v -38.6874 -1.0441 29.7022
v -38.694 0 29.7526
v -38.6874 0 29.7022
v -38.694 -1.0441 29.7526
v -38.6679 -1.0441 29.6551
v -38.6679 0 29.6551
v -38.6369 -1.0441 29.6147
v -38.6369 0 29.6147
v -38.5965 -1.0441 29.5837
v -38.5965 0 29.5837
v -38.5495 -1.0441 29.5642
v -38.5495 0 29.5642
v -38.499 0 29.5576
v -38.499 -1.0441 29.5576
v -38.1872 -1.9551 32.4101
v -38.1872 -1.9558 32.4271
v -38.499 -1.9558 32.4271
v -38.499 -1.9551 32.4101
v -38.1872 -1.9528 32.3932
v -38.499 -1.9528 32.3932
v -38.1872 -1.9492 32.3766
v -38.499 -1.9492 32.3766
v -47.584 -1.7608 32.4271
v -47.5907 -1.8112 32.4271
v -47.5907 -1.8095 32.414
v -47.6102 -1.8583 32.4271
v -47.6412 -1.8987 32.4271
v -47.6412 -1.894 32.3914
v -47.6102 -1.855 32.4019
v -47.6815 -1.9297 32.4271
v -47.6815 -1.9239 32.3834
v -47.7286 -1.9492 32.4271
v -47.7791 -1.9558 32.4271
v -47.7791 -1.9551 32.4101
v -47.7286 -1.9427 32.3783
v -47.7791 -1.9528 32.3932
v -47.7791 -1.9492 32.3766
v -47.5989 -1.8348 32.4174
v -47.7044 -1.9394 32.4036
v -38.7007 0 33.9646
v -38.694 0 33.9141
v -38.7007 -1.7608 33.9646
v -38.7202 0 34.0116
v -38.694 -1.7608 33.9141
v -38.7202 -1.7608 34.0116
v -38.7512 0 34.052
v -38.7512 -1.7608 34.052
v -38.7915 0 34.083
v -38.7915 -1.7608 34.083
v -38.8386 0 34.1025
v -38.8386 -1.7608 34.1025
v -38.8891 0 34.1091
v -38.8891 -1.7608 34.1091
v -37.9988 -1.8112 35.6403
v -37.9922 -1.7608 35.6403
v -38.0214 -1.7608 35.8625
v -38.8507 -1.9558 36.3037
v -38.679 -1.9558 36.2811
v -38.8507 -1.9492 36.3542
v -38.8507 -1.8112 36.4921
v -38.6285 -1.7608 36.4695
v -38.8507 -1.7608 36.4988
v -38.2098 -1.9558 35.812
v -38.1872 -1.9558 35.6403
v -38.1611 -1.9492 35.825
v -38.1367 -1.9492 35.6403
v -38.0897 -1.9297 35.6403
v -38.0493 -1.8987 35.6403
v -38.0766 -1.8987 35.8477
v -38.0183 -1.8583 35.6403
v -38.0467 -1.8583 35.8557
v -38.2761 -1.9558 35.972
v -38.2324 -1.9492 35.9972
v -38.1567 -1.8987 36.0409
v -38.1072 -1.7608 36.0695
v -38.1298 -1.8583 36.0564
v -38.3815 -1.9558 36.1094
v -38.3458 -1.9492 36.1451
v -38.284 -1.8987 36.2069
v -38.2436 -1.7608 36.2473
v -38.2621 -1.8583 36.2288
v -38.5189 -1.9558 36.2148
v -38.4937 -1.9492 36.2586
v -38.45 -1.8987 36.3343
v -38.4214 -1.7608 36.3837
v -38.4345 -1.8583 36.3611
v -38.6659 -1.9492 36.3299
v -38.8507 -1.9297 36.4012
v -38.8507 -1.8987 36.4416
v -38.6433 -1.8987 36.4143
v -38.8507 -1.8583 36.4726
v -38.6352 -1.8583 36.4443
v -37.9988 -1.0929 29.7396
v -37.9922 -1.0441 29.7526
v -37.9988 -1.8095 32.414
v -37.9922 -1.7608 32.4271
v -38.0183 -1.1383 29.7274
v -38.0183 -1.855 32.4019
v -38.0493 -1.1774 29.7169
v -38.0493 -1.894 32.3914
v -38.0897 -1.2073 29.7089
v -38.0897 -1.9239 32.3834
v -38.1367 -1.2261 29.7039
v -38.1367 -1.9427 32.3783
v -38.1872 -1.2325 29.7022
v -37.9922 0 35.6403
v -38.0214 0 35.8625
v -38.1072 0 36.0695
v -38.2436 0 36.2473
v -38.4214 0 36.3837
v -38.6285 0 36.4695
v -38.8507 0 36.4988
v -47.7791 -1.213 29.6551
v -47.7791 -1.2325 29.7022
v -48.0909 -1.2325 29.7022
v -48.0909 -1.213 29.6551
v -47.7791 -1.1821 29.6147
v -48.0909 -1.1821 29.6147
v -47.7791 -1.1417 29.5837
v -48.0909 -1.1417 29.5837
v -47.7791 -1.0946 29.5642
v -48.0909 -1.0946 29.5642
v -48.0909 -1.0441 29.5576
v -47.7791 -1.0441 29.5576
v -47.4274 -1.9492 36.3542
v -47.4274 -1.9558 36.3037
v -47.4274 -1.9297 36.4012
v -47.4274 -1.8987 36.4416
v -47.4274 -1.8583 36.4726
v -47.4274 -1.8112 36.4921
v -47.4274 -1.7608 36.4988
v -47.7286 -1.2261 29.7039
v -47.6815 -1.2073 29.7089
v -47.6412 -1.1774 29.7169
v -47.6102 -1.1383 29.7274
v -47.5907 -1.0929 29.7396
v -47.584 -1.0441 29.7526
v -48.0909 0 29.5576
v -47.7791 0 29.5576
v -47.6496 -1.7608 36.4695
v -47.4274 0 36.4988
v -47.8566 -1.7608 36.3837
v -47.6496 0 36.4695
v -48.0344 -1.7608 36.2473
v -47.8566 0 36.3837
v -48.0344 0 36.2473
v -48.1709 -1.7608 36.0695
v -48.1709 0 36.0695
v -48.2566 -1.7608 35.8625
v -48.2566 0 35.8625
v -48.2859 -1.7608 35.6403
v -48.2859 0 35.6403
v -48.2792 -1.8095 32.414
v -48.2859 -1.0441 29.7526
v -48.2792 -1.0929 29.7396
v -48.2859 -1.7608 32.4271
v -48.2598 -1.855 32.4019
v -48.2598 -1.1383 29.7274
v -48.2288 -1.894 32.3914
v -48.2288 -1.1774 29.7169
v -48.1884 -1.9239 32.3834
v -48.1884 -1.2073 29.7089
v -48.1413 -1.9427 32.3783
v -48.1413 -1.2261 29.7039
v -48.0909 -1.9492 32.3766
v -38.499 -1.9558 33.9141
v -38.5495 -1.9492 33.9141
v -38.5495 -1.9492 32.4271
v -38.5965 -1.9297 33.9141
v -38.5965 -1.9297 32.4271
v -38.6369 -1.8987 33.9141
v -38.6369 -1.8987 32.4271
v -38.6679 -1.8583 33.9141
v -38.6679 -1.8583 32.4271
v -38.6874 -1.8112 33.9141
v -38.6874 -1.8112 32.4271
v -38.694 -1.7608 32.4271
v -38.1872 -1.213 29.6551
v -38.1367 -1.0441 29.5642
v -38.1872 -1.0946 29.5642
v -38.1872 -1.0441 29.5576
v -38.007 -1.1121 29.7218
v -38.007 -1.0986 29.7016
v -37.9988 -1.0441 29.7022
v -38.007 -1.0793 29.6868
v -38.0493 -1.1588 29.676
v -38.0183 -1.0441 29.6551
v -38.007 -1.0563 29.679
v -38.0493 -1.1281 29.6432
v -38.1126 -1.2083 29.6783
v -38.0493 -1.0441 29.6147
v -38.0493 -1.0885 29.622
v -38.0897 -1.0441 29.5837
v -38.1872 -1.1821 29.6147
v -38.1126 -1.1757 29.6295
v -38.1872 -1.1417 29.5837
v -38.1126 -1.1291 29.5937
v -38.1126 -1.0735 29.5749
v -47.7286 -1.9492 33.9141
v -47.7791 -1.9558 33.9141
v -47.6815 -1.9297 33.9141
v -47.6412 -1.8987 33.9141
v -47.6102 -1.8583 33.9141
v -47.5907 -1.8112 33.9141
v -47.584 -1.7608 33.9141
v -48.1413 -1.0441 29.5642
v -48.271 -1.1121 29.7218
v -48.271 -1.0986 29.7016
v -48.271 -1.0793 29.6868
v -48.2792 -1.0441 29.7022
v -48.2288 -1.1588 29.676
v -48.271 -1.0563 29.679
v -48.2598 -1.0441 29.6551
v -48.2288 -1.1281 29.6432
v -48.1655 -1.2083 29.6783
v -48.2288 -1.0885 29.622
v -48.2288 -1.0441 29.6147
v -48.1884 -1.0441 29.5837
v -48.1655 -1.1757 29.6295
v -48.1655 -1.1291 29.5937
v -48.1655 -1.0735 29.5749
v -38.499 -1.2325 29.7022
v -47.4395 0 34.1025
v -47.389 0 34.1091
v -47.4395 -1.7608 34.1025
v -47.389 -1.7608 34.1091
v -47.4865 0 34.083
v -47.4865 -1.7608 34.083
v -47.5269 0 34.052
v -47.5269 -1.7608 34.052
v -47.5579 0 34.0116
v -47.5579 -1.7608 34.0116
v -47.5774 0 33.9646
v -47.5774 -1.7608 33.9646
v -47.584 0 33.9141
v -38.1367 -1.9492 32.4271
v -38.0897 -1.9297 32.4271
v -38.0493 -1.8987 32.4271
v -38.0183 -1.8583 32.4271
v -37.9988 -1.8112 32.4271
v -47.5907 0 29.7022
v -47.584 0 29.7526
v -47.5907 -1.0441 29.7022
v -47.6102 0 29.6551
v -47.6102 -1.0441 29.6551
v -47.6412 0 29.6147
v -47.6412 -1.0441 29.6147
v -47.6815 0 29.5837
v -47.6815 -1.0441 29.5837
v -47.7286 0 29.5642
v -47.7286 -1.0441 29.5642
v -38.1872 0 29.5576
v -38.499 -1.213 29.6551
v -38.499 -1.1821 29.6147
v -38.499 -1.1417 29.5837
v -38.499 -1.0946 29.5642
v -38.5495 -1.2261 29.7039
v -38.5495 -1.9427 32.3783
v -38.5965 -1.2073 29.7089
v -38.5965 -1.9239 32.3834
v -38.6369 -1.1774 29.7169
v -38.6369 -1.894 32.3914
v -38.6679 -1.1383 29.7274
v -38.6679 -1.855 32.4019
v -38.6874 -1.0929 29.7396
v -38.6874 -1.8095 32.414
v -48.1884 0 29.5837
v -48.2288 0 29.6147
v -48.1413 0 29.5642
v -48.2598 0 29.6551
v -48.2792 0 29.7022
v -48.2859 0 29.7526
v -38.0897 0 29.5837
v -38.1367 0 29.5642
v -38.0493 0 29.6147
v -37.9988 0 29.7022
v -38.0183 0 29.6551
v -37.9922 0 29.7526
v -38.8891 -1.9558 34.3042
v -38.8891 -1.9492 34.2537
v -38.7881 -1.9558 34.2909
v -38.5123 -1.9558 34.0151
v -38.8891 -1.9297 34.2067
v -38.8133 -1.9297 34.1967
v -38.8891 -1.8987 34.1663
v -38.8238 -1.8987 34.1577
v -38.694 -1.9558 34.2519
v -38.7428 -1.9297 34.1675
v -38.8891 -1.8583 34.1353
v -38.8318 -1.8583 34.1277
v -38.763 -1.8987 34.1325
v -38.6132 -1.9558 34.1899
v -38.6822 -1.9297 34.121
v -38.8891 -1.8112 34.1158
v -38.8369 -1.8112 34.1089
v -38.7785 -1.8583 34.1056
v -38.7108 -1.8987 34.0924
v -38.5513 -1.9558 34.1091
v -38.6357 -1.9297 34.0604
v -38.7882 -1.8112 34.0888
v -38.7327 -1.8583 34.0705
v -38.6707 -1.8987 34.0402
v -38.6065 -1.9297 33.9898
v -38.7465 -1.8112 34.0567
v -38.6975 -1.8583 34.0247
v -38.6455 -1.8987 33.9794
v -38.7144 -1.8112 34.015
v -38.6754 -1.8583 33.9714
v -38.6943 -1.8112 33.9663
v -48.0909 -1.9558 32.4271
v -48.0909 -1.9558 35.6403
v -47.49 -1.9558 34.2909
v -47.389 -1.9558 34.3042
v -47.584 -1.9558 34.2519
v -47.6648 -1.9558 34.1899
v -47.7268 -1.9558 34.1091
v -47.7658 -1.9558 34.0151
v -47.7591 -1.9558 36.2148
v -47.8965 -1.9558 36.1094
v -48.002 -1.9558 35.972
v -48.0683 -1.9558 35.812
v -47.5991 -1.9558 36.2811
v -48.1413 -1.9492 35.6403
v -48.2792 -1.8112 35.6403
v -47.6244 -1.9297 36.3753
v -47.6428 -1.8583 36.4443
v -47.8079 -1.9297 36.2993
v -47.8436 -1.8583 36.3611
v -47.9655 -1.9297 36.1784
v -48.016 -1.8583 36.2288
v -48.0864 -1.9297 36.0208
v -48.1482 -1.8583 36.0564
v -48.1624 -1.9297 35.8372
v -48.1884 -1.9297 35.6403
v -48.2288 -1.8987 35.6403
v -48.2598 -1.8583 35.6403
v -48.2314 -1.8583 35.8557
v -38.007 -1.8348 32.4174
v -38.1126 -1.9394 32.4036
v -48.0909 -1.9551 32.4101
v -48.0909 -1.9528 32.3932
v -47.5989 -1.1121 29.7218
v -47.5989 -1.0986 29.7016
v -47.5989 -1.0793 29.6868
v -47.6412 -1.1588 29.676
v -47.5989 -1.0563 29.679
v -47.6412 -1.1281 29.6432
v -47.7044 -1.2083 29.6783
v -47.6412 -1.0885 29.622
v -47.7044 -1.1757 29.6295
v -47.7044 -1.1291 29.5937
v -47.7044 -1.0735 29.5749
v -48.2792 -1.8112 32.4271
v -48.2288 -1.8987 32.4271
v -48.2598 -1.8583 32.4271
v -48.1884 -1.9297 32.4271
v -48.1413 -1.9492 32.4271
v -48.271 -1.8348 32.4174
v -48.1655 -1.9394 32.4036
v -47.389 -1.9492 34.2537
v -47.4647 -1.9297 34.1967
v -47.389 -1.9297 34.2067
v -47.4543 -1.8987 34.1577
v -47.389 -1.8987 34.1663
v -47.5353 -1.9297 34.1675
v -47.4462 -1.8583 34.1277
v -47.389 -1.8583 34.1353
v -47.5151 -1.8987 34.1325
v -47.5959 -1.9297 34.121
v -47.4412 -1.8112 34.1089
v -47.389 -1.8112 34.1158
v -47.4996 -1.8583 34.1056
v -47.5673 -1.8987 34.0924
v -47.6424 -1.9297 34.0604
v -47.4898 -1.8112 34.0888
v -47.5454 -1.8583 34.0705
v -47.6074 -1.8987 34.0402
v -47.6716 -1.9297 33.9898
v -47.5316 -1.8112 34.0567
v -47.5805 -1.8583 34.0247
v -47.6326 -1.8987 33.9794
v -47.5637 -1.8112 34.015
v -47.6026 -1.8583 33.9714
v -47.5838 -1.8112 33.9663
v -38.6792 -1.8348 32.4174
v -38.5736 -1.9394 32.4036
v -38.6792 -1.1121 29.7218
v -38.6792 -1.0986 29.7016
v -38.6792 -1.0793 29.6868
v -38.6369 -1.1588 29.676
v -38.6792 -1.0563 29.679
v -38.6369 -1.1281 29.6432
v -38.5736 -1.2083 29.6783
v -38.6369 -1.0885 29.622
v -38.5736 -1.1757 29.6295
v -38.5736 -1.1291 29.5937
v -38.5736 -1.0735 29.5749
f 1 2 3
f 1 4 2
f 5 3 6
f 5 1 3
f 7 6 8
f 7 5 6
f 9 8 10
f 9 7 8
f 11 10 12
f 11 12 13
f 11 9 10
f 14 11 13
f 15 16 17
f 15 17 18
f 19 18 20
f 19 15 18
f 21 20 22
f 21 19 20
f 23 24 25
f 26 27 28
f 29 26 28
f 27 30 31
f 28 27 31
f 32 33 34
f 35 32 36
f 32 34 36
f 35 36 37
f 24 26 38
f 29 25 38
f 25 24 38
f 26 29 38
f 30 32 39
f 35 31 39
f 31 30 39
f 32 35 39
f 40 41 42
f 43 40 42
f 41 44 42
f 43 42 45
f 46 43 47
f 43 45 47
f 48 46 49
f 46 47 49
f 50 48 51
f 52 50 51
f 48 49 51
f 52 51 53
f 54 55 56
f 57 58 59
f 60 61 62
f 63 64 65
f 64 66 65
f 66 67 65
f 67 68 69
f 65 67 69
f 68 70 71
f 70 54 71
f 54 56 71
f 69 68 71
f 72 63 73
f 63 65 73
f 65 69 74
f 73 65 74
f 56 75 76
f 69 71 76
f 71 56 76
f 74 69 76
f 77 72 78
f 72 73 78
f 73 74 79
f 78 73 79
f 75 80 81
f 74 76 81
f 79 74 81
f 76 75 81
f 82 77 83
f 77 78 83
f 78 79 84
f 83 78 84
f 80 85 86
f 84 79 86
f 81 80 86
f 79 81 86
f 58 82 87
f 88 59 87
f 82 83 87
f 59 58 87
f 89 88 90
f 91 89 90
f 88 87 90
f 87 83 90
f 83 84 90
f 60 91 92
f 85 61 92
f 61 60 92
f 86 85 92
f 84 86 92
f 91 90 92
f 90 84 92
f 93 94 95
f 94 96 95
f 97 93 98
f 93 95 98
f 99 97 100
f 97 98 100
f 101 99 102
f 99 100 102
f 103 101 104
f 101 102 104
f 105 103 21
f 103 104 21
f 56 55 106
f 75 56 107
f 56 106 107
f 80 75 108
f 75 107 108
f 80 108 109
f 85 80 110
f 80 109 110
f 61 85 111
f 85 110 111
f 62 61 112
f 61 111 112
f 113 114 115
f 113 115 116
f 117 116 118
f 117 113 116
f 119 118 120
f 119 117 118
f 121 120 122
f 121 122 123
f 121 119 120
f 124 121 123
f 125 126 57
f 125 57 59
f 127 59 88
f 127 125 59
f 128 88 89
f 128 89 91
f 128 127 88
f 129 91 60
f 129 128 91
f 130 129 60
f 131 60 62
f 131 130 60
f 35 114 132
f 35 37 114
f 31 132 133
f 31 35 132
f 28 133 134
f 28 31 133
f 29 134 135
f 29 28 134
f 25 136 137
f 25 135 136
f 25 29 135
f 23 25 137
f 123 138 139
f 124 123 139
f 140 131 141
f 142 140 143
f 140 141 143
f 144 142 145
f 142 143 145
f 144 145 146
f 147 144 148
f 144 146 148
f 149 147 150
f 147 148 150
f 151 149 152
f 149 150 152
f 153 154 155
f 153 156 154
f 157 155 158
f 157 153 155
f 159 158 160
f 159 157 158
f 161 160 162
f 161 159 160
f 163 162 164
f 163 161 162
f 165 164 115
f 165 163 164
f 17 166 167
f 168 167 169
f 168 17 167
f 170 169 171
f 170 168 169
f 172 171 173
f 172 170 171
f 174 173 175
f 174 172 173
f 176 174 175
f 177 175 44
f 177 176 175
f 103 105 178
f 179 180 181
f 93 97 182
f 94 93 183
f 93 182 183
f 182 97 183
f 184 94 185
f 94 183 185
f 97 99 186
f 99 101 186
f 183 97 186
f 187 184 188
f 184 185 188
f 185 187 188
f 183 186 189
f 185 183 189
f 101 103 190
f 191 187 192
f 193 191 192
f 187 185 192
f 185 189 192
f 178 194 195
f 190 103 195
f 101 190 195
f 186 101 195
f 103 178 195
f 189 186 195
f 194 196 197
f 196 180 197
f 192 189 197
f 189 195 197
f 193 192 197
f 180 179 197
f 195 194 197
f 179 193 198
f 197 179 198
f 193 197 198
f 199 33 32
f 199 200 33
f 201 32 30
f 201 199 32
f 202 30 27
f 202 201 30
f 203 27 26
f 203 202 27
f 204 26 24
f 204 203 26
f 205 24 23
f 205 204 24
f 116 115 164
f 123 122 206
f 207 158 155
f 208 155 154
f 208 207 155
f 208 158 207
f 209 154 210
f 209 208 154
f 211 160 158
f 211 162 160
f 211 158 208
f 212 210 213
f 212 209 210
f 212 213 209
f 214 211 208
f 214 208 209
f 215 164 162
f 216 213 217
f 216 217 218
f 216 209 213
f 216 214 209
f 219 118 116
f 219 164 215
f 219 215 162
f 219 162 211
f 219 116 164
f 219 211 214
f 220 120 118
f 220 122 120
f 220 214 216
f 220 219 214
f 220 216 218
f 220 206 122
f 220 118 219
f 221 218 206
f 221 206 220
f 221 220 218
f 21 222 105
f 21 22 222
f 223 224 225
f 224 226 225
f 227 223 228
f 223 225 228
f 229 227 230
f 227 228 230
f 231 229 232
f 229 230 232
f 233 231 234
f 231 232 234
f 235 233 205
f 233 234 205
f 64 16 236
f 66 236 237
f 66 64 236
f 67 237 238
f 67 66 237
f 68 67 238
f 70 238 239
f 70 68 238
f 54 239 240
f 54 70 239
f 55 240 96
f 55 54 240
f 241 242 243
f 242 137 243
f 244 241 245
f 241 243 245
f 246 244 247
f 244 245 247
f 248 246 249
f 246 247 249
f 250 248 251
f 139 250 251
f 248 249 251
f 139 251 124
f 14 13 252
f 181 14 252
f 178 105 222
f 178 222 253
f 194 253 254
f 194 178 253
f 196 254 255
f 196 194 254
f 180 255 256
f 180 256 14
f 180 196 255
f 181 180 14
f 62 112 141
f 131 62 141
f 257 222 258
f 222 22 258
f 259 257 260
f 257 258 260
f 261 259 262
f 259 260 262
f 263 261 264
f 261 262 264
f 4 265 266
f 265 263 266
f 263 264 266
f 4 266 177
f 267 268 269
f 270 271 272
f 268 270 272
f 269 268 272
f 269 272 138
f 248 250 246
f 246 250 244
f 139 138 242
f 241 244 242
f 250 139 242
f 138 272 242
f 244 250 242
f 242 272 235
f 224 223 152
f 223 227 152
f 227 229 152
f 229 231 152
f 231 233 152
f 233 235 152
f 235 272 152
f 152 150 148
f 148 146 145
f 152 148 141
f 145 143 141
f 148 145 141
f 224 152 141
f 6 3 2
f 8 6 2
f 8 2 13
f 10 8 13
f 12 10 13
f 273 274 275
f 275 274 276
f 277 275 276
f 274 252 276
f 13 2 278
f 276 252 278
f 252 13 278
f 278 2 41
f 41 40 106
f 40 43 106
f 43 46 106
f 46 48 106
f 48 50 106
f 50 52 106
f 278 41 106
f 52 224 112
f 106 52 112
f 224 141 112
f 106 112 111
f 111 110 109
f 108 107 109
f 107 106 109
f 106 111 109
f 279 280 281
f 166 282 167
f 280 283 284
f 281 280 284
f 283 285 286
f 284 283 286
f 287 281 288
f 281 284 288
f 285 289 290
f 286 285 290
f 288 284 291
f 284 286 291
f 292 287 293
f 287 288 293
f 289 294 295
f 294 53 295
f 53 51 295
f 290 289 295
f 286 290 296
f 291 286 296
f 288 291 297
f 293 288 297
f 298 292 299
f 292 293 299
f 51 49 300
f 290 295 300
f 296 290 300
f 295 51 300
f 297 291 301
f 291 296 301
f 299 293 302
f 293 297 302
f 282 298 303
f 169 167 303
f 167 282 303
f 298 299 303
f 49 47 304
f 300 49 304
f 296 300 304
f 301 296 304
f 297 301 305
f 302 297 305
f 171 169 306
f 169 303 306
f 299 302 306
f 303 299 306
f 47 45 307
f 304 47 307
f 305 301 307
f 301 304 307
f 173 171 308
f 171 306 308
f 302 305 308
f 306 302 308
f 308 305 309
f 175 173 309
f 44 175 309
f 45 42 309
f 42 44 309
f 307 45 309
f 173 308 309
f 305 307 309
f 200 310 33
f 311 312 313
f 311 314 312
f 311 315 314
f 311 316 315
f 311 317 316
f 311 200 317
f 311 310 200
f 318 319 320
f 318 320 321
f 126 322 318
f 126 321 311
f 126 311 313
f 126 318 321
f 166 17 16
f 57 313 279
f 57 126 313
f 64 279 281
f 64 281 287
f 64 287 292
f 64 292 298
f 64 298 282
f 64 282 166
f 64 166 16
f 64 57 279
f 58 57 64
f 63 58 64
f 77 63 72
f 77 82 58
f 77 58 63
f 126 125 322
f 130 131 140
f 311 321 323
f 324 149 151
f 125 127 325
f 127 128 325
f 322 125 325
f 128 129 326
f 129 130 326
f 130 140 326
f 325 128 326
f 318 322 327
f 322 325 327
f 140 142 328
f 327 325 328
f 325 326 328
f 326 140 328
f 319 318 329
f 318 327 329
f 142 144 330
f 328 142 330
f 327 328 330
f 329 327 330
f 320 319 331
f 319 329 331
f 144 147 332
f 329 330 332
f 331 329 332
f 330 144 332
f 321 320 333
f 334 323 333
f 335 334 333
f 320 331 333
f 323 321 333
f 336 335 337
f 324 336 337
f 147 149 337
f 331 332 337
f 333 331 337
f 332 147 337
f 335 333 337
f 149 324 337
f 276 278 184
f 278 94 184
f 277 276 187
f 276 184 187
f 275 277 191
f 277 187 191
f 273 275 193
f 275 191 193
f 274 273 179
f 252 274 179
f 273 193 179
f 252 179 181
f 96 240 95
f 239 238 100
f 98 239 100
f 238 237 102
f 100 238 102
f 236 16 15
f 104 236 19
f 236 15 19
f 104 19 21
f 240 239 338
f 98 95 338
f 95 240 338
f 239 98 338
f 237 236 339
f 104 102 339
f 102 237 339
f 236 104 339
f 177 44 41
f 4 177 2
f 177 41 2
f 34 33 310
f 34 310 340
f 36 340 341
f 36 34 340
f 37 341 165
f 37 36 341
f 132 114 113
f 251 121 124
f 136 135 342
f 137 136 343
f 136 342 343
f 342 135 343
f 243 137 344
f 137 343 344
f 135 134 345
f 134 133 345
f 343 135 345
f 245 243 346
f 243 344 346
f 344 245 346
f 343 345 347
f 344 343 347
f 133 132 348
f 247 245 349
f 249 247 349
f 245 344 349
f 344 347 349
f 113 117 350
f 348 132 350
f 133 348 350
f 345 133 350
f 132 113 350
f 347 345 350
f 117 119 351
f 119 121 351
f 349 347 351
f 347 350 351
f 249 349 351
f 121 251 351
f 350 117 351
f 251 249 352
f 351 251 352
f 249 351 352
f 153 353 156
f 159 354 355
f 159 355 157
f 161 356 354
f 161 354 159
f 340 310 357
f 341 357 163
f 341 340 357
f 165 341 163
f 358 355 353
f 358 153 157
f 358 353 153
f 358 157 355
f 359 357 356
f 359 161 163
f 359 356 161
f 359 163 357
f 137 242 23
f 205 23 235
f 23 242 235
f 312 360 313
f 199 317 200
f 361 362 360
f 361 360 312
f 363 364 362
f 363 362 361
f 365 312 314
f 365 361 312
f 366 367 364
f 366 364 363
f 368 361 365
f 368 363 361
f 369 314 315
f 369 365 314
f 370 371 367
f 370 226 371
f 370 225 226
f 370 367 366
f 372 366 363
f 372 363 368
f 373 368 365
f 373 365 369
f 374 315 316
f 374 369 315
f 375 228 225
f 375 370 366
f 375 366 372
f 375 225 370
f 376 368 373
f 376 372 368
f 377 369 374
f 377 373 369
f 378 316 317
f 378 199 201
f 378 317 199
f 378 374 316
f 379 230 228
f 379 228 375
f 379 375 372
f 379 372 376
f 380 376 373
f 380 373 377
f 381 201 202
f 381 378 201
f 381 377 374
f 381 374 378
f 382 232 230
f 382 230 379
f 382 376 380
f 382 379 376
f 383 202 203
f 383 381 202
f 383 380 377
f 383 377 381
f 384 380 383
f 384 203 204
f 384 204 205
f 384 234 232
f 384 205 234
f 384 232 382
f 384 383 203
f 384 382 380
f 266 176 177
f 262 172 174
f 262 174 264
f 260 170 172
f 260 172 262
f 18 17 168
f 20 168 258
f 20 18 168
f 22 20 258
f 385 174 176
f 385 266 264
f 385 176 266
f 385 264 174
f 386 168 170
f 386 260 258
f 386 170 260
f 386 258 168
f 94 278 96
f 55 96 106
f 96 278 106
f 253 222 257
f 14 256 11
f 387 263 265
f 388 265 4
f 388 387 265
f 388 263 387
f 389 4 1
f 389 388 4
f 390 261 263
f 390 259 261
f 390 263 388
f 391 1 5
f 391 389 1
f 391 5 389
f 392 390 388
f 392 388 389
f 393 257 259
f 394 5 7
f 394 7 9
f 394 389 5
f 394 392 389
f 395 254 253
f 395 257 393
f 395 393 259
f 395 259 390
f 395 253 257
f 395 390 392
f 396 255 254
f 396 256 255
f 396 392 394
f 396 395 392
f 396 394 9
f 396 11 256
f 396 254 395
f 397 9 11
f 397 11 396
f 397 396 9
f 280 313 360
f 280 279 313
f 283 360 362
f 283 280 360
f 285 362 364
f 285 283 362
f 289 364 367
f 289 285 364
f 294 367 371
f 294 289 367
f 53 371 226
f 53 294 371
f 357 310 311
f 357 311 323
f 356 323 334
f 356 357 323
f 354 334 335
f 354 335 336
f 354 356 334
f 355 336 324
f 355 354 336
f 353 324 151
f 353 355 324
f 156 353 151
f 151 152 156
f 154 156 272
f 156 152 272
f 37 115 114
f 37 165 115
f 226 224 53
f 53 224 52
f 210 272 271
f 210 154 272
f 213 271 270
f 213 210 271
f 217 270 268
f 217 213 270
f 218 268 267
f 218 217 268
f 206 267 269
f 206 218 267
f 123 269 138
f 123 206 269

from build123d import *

# Parameters (mm, degrees)
F1_DEPTH    = 1.9558
F2_SIZE2    = 2.8438227154
F2_SIZE     = 0.762
F2_2_SIZE2  = 2.8438227154
F2_2_SIZE   = 0.762
F3_R        = 0.1950302499
F4_T1_DEPTH = 4.1020358569
F4_T4_ANGLE = 90
F4_T6_ANGLE = 90


# Not quite as in the source:
# - a fillet or chamfer that OpenCascade refuses, or shapes differently, is made with other operations: its cross-section is extruded or revolved along the edge and cut away or added


with BuildPart() as f1:
    # F0 (on Front) → F1 (new body)
    with BuildSketch(Plane.XZ):
        Polygon((-37.9921731242, 36.4987568722), (-48.2858929149, 36.4987568722), (-48.2858929149, 34.1091437473), (-48.2858929149, 29.5576006174), (-47.5840330195, 29.5576006174), (-47.5840330195, 34.1091437473), (-43.1390330195, 34.1091437473), (-38.6940330195, 34.1091437473), (-38.6940330195, 29.5576006174), (-37.9921731242, 29.5576006174), (-37.9921731242, 34.1091437473), align=None)
    extrude(amount=F1_DEPTH)

    # F2
    f2_edges = [f1.edges().sort_by_distance(p)[0] for p in [
        (-47.934963, -1.9558, 29.557601),
    ]]
    f2_side = f1.faces().sort_by_distance((-47.934963, -0.9779, 29.557601))[0]
    chamfer(f2_edges, length=F2_SIZE, length2=F2_SIZE2, reference=f2_side)

    # F2#2
    f2_2_edges = [f1.edges().sort_by_distance(p)[0] for p in [
        (-38.343103, -1.9558, 29.557601),
    ]]
    f2_2_side = f1.faces().sort_by_distance((-38.343103, -0.9779, 29.557601))[0]
    chamfer(f2_2_edges, length=F2_2_SIZE, length2=F2_2_SIZE2, reference=f2_2_side)

    # F3
    f3_edges = [f1.edges().sort_by_distance(p)[0] for p in [
        (-47.934963, -1.1938, 29.557601),
        (-38.343103, -1.1938, 29.557601),
        (-37.992173, -1.5748, 30.979512),
        (-38.694033, -1.5748, 30.979512),
        (-38.343103, -1.9558, 32.401423),
        (-43.139033, -1.9558, 34.109144),
        (-47.584033, -1.5748, 30.979512),
        (-48.285893, -1.5748, 30.979512),
        (-47.934963, -1.9558, 32.401423),
        (-47.584033, -1.9558, 33.255284),
        (-38.694033, -1.9558, 33.255284),
        (-37.992173, -1.9558, 34.45009),
        (-38.694033, -0.5969, 29.557601),
        (-37.992173, -0.5969, 29.557601),
        (-38.694033, -0.9779, 34.109144),
        (-47.584033, -0.9779, 34.109144),
        (-47.584033, -0.5969, 29.557601),
        (-48.285893, -0.5969, 29.557601),
        (-48.285893, -1.9558, 34.45009),
        (-43.139033, -1.9558, 36.498757),
    ]]
    fillet(f3_edges, radius=F3_R)

    # F4: fillet of radius 0.8584943428 on 2 edges, made by hand

    # F4_s2 → F4_t1 (cut)
    with BuildSketch(Plane.XZ.offset(-2.1462358569)):
        with BuildLine():
            ThreePointArc((-37.9921731242, 35.6402625294), (-38.2436202956, 36.2473097008), (-38.850667467, 36.4987568722))
            Line((-38.850667467, 36.4987568722), (-37.9921731242, 36.4987568722))
            Line((-37.9921731242, 36.4987568722), (-37.9921731242, 35.6402625294))
        make_face()
        with BuildLine():
            ThreePointArc((-47.4273985721, 36.4987568722), (-48.0344457435, 36.2473097008), (-48.2858929149, 35.6402625294))
            Line((-48.2858929149, 35.6402625294), (-48.2858929149, 36.4987568722))
            Line((-48.2858929149, 36.4987568722), (-47.4273985721, 36.4987568722))
        make_face()
    extrude(amount=F4_T1_DEPTH, mode=Mode.SUBTRACT)

    # F4_s3 → F4_t4 (revolve, cut)
    with BuildSketch(Plane.YZ.offset(-47.4273985721)):
        with BuildLine():
            ThreePointArc((-1.9558, 36.3037266223), (-1.8986769623, 36.4416338345), (-1.7607697501, 36.4987568722))
            Line((-1.7607697501, 36.4987568722), (-1.9558, 36.4987568722))
            Line((-1.9558, 36.4987568722), (-1.9558, 36.3037266223))
        make_face()
    revolve(axis=Axis((-47.4273985721, -1.9558, 35.6402625294), (0, -1, 0)), revolution_arc=F4_T4_ANGLE, mode=Mode.SUBTRACT)

    # F4_s5 → F4_t6 (revolve, cut)
    with BuildSketch(Plane.XY.offset(35.6402625294)):
        with BuildLine():
            ThreePointArc((-38.1872033741, -1.9558), (-38.0492961619, -1.8986769623), (-37.9921731242, -1.7607697501))
            Line((-37.9921731242, -1.7607697501), (-37.9921731242, -1.9558))
            Line((-37.9921731242, -1.9558), (-38.1872033741, -1.9558))
        make_face()
    revolve(axis=Axis((-38.850667467, -1.9558, 35.6402625294), (0, -1, 0)), revolution_arc=F4_T6_ANGLE, mode=Mode.SUBTRACT)


solid = f1.part
